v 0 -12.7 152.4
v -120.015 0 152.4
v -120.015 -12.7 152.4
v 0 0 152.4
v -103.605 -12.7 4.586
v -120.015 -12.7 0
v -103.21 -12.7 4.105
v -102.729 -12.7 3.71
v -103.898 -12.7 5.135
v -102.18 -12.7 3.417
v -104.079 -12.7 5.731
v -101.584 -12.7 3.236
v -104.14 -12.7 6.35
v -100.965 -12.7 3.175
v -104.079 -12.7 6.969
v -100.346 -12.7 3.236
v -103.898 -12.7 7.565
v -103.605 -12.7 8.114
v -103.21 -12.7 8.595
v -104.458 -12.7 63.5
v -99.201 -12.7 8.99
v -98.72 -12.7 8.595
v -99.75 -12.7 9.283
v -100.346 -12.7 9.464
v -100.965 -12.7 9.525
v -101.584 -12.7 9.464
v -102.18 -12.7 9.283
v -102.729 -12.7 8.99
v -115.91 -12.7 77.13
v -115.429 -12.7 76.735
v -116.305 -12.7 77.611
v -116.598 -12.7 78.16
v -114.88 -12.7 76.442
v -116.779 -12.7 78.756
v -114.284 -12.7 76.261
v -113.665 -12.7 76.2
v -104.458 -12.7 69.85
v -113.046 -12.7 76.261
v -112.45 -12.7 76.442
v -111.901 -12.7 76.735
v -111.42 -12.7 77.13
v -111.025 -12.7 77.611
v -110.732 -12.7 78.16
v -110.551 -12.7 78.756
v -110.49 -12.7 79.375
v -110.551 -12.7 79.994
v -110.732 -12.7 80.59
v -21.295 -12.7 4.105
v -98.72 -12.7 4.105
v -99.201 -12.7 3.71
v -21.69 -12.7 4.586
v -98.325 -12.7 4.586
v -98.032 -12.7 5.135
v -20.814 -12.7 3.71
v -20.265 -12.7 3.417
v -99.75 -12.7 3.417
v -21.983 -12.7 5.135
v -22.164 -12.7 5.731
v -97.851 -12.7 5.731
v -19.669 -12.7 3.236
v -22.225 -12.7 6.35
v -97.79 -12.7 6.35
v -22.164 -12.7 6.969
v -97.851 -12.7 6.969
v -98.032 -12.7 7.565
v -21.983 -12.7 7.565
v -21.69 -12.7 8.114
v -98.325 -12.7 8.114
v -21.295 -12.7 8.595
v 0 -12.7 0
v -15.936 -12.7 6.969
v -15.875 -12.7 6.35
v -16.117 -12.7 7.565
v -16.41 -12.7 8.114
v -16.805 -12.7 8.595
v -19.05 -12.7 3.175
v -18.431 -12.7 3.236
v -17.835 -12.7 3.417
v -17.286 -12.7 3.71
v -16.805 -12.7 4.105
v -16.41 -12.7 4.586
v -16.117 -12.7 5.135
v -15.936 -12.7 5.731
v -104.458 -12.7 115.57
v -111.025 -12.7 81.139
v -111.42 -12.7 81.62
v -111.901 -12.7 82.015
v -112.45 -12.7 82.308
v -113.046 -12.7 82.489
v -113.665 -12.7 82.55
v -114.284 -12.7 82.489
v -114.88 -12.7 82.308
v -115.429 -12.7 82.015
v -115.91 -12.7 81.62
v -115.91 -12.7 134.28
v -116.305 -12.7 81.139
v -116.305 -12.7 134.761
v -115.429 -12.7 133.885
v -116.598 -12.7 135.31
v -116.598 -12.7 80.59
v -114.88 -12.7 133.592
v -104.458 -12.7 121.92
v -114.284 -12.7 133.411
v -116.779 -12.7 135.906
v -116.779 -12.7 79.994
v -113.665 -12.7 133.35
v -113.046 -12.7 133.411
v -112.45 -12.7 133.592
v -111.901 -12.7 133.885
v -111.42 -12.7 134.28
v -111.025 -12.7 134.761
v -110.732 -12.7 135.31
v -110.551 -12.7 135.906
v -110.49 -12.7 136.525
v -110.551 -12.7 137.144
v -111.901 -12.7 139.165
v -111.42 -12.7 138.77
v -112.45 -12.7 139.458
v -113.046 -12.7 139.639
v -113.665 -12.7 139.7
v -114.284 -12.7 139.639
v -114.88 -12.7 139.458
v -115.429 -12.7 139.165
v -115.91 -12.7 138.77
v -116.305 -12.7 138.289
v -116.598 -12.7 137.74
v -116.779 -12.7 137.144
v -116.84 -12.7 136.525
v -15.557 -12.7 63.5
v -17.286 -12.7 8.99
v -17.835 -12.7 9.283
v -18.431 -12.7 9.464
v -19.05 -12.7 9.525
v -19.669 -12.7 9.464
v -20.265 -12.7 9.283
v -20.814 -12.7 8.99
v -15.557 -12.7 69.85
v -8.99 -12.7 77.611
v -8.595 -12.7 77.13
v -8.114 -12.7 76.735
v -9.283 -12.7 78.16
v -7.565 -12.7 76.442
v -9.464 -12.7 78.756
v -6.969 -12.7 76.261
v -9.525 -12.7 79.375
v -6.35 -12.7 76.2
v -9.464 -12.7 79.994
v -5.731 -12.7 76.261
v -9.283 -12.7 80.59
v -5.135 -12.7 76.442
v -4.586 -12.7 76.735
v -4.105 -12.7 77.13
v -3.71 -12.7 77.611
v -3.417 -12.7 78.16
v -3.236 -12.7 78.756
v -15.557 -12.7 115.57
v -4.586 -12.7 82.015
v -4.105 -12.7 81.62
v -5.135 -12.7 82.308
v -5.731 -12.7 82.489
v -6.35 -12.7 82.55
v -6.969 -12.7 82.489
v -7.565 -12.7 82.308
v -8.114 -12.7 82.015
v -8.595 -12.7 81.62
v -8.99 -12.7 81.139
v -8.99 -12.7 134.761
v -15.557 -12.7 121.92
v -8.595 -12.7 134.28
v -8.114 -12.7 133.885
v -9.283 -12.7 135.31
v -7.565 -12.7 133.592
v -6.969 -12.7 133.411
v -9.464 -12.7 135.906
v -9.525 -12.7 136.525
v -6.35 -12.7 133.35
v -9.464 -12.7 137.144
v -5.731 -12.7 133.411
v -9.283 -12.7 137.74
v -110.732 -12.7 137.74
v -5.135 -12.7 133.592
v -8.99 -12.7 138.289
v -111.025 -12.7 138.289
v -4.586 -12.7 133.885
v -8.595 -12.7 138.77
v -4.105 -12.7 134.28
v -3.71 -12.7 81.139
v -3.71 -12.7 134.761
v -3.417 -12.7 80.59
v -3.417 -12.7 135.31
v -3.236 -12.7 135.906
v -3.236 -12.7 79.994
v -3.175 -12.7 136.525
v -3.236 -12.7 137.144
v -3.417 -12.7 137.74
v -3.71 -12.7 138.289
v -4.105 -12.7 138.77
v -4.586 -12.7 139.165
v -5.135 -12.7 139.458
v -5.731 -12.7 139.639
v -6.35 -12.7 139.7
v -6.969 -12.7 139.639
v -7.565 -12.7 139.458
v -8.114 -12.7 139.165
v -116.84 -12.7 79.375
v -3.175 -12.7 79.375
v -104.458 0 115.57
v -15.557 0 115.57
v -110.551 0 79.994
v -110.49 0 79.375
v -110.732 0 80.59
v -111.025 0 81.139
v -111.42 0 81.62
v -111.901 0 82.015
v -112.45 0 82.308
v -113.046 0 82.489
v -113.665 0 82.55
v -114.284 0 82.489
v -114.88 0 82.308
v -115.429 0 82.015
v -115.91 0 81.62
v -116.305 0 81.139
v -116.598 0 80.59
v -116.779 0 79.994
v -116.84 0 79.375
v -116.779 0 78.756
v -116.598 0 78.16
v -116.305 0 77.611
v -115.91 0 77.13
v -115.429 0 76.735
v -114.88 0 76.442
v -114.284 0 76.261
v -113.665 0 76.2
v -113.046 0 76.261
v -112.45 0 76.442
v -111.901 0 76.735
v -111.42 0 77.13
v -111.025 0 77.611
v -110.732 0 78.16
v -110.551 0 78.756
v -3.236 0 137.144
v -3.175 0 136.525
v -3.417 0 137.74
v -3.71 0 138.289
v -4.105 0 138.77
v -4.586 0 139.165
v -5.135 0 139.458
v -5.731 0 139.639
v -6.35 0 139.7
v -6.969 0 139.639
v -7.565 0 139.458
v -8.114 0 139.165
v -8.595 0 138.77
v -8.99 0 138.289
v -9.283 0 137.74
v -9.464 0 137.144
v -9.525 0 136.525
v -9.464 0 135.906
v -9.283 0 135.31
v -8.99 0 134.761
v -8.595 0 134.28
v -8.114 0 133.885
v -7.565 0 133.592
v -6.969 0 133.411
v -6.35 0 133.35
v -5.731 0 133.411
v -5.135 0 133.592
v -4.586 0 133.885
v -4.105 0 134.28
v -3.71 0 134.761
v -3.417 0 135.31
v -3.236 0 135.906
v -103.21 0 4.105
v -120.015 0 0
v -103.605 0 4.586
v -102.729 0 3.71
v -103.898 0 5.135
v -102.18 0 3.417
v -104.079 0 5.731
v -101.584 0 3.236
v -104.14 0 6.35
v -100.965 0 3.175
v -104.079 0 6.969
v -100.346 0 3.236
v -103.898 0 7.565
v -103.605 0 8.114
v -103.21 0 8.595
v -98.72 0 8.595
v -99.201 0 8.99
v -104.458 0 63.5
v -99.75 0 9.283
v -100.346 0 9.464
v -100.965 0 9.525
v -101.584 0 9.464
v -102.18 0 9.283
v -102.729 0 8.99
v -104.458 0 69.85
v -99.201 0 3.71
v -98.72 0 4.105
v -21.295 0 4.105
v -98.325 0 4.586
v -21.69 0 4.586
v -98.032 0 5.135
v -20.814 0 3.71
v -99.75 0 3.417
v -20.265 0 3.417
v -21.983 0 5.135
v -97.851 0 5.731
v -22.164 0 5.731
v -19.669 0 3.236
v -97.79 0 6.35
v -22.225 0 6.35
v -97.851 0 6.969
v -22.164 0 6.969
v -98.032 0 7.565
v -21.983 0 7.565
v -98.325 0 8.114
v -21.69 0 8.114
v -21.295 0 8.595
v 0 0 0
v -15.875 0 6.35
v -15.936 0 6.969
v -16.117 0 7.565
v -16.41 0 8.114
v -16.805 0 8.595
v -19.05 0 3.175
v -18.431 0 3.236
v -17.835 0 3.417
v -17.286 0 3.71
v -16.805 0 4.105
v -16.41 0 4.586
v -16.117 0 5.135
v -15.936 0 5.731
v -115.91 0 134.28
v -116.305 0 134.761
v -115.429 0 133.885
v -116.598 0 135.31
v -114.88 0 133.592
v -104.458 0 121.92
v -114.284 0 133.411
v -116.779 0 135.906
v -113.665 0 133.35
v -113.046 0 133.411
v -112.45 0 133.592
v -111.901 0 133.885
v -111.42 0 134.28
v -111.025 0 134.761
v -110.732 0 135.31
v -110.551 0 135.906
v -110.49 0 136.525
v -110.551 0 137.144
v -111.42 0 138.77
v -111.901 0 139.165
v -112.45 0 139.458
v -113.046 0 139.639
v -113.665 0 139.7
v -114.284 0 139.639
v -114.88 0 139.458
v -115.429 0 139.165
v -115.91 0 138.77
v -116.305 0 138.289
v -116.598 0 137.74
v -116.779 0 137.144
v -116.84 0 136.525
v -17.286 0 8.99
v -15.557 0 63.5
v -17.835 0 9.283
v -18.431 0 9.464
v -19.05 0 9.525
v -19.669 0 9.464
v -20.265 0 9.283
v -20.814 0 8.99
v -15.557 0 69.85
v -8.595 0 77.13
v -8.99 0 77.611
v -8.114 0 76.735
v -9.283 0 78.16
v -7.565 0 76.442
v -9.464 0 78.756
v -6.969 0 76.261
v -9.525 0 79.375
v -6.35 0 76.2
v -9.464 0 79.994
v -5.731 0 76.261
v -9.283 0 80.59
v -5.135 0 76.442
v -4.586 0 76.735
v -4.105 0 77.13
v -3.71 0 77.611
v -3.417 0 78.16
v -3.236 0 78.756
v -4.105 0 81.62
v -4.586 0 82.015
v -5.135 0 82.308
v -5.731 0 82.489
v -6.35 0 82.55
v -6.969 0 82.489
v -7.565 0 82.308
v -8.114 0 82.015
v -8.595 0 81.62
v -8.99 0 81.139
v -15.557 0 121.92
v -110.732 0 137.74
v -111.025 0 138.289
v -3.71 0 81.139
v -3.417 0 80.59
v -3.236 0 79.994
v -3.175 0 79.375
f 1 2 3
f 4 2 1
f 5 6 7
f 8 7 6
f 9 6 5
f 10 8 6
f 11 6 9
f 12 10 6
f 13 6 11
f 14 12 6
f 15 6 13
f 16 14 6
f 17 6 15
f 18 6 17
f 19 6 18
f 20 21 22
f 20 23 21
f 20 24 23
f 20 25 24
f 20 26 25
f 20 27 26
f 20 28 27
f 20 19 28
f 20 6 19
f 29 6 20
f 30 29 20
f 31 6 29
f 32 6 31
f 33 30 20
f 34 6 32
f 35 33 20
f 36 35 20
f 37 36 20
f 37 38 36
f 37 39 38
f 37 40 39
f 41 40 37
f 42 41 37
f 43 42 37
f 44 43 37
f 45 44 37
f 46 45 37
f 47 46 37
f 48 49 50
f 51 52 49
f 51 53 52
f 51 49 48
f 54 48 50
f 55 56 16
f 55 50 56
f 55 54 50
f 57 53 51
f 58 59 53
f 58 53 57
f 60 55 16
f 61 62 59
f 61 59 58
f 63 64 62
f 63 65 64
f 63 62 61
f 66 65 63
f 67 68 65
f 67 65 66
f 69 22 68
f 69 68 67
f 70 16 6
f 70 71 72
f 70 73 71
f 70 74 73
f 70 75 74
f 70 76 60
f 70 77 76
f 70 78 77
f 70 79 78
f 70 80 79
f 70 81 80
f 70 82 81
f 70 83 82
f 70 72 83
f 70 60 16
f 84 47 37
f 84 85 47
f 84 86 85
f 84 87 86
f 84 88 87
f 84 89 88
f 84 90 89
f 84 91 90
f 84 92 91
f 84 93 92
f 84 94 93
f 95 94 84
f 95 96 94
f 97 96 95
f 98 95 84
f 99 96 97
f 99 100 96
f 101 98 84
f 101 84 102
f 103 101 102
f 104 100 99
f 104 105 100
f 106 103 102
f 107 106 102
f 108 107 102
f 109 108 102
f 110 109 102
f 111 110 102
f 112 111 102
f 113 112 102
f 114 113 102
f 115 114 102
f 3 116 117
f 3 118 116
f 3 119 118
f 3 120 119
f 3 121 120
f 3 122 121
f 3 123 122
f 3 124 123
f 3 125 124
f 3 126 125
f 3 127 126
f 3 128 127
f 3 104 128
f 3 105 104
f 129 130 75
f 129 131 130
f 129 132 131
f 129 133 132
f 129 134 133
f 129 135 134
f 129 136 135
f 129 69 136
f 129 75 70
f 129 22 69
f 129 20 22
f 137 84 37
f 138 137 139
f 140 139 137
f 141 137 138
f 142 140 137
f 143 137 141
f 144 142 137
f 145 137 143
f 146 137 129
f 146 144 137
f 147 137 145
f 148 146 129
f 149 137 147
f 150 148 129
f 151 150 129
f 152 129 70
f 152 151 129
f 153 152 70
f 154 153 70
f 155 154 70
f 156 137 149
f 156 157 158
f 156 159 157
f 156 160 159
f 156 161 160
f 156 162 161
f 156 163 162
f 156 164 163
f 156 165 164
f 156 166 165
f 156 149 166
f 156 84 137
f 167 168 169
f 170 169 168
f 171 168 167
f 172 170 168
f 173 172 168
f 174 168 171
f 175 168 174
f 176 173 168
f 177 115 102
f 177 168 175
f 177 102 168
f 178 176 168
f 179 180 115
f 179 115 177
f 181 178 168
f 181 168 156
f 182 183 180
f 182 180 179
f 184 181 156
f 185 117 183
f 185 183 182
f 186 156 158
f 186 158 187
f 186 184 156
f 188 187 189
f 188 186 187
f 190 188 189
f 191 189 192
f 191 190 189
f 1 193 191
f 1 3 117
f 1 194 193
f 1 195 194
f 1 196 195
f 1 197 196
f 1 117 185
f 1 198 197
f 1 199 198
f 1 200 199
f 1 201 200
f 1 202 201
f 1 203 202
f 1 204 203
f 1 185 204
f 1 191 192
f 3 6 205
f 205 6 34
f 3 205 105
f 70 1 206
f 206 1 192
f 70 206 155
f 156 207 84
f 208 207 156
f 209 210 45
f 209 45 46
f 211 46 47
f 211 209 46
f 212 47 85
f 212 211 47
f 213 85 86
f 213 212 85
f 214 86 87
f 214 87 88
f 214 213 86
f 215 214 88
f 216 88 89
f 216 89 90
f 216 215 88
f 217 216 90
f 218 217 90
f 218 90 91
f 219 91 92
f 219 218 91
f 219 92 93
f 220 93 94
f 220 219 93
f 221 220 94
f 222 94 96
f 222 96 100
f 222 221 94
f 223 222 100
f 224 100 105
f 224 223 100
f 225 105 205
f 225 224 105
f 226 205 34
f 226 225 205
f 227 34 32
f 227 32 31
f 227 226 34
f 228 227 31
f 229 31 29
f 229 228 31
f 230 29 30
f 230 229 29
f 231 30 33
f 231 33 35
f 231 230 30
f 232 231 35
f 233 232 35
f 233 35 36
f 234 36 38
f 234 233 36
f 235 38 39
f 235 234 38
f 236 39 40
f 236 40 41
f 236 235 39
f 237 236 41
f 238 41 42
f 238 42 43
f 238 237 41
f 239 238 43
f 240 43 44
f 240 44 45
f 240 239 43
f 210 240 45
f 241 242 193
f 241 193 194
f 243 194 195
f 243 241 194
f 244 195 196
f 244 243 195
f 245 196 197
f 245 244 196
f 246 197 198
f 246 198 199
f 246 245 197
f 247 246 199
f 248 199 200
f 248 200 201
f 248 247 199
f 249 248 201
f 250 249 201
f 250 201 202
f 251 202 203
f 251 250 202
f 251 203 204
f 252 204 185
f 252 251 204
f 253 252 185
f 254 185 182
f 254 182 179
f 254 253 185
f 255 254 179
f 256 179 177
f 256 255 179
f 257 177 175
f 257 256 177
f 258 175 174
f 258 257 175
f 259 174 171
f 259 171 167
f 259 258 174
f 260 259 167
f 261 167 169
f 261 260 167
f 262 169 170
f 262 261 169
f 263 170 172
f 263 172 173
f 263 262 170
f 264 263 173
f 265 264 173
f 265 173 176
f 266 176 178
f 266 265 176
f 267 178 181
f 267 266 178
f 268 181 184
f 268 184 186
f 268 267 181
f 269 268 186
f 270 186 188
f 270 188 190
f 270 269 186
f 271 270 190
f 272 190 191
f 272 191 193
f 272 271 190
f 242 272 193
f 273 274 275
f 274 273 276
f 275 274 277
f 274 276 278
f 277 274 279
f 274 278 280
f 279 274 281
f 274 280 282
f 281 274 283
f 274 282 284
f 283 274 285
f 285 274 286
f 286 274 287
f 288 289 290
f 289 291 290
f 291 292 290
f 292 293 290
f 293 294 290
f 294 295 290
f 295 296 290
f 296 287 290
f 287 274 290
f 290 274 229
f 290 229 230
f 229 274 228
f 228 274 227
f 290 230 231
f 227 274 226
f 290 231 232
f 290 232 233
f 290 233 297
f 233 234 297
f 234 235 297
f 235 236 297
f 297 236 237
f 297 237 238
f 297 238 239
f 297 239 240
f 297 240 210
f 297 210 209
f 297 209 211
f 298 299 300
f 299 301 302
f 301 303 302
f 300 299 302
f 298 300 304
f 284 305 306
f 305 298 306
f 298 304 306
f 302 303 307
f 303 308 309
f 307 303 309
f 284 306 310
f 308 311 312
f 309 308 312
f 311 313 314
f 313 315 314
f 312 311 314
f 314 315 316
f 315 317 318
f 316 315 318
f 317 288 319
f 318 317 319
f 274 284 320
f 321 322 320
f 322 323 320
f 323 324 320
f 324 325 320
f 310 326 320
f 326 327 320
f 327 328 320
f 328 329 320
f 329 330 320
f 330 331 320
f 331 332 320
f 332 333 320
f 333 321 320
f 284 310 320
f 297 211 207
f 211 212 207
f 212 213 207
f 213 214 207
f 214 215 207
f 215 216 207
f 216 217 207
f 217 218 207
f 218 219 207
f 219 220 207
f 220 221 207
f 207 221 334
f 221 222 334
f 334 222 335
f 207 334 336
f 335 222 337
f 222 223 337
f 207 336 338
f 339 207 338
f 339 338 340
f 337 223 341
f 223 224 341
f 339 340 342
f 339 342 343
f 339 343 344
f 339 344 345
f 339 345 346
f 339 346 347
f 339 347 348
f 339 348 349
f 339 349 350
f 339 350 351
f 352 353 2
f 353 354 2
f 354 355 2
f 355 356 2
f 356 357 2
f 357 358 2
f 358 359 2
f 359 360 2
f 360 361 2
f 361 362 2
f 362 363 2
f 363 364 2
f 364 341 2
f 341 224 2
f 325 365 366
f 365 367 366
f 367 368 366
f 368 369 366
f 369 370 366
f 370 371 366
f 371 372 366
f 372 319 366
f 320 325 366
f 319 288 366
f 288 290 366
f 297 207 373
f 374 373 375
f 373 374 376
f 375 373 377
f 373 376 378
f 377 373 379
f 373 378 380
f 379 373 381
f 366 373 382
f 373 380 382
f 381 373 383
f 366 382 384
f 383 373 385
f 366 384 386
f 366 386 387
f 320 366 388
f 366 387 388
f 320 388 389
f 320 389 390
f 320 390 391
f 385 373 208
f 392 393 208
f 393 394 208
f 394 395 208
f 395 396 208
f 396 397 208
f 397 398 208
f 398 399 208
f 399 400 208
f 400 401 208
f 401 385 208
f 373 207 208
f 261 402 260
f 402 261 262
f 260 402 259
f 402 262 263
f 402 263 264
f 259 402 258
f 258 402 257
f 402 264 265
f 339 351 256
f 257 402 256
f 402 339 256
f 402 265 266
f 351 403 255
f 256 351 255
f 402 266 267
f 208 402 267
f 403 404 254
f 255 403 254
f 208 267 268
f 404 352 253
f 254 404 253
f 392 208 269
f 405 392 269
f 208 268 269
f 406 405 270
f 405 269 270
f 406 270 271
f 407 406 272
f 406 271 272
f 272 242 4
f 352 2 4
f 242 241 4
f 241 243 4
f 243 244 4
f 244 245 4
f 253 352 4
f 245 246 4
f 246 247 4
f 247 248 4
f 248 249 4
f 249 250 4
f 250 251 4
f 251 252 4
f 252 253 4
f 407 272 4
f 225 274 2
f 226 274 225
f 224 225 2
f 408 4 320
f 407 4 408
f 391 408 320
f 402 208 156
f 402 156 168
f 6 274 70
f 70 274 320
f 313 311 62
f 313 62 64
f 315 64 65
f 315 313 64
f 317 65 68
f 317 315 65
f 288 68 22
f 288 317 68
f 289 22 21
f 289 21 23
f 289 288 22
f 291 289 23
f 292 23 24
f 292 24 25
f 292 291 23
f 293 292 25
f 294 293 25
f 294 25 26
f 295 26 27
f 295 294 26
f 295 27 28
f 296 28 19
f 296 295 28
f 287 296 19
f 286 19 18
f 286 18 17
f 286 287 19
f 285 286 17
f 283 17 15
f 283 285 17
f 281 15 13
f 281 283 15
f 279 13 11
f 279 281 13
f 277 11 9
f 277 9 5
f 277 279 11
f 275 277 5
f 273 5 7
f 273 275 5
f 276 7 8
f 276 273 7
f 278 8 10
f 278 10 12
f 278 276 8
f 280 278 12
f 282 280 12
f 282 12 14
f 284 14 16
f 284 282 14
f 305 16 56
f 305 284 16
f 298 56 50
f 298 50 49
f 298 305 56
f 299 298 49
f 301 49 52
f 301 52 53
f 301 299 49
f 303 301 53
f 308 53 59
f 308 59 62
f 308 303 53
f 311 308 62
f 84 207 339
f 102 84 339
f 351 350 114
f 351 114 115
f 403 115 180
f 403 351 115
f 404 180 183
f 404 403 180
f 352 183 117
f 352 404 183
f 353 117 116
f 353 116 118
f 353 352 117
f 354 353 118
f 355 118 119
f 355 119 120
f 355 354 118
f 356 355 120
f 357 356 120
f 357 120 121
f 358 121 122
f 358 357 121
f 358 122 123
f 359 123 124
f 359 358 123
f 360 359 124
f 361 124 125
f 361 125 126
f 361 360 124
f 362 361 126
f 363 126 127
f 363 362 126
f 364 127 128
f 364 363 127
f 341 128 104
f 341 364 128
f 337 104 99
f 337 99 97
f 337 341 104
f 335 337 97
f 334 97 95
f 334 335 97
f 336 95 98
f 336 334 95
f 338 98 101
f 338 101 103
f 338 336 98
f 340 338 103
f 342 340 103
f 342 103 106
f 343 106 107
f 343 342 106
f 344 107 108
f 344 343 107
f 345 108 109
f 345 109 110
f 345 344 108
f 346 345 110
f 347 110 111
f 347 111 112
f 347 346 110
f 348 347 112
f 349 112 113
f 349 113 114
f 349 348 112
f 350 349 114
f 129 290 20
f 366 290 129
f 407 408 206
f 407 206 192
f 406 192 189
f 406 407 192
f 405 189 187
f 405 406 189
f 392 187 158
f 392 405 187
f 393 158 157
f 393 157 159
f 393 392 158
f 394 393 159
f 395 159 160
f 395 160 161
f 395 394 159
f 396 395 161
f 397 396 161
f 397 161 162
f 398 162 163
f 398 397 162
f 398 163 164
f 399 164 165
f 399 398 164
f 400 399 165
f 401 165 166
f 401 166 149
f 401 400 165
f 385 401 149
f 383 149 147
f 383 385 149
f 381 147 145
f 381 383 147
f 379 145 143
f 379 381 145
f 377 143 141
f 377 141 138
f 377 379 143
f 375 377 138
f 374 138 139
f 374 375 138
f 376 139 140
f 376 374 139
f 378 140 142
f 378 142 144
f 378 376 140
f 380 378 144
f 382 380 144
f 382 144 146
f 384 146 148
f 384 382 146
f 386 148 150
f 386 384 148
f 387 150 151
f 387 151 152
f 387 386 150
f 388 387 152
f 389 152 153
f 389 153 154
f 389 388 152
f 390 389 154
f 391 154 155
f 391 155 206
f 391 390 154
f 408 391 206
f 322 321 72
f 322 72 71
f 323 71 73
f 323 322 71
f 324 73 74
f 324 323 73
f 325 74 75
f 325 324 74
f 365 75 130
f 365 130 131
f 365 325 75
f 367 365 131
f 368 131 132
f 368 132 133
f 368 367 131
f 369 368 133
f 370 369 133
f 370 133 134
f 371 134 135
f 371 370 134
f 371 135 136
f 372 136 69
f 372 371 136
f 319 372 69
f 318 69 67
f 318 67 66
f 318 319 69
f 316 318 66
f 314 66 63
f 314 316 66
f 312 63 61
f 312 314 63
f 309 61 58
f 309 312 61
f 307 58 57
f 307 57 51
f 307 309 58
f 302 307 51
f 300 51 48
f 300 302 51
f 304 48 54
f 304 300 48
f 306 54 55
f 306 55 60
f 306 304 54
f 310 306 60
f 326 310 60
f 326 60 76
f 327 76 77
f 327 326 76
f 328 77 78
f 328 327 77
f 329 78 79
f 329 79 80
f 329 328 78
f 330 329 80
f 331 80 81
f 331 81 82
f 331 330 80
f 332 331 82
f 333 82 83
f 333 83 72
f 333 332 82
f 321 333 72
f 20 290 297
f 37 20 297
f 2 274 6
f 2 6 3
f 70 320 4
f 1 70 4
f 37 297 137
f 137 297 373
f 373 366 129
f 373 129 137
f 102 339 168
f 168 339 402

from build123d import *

# Parameters (mm, degrees)
F0_W     = 120.015
F0_H     = 152.4
F0_R     = 3.175
F0_W_2   = 88.9
F0_H_2   = 6.35
F1_DEPTH = 12.7


with BuildPart() as f1:
    # F0 (on Front) → F1 (new body)
    with BuildSketch(Plane.XZ):
        with Locations((-60.0075, 76.2)):
            Rectangle(F0_W, F0_H)
        with Locations((-100.965, 6.35)):
            Circle(F0_R, mode=Mode.SUBTRACT)
        with Locations((-19.05, 6.35)):
            Circle(F0_R, mode=Mode.SUBTRACT)
        with Locations((-60.0075, 66.675)):
            Rectangle(F0_W_2, F0_H_2, mode=Mode.SUBTRACT)
        with Locations((-113.665, 79.375)):
            Circle(F0_R, mode=Mode.SUBTRACT)
        with Locations((-113.665, 136.525)):
            Circle(F0_R, mode=Mode.SUBTRACT)
        with Locations((-6.35, 79.375)):
            Circle(F0_R, mode=Mode.SUBTRACT)
        with Locations((-60.0075, 118.745)):
            Rectangle(F0_W_2, F0_H_2, mode=Mode.SUBTRACT)
        with Locations((-6.35, 136.525)):
            Circle(F0_R, mode=Mode.SUBTRACT)
    extrude(amount=F1_DEPTH)


solid = f1.part
